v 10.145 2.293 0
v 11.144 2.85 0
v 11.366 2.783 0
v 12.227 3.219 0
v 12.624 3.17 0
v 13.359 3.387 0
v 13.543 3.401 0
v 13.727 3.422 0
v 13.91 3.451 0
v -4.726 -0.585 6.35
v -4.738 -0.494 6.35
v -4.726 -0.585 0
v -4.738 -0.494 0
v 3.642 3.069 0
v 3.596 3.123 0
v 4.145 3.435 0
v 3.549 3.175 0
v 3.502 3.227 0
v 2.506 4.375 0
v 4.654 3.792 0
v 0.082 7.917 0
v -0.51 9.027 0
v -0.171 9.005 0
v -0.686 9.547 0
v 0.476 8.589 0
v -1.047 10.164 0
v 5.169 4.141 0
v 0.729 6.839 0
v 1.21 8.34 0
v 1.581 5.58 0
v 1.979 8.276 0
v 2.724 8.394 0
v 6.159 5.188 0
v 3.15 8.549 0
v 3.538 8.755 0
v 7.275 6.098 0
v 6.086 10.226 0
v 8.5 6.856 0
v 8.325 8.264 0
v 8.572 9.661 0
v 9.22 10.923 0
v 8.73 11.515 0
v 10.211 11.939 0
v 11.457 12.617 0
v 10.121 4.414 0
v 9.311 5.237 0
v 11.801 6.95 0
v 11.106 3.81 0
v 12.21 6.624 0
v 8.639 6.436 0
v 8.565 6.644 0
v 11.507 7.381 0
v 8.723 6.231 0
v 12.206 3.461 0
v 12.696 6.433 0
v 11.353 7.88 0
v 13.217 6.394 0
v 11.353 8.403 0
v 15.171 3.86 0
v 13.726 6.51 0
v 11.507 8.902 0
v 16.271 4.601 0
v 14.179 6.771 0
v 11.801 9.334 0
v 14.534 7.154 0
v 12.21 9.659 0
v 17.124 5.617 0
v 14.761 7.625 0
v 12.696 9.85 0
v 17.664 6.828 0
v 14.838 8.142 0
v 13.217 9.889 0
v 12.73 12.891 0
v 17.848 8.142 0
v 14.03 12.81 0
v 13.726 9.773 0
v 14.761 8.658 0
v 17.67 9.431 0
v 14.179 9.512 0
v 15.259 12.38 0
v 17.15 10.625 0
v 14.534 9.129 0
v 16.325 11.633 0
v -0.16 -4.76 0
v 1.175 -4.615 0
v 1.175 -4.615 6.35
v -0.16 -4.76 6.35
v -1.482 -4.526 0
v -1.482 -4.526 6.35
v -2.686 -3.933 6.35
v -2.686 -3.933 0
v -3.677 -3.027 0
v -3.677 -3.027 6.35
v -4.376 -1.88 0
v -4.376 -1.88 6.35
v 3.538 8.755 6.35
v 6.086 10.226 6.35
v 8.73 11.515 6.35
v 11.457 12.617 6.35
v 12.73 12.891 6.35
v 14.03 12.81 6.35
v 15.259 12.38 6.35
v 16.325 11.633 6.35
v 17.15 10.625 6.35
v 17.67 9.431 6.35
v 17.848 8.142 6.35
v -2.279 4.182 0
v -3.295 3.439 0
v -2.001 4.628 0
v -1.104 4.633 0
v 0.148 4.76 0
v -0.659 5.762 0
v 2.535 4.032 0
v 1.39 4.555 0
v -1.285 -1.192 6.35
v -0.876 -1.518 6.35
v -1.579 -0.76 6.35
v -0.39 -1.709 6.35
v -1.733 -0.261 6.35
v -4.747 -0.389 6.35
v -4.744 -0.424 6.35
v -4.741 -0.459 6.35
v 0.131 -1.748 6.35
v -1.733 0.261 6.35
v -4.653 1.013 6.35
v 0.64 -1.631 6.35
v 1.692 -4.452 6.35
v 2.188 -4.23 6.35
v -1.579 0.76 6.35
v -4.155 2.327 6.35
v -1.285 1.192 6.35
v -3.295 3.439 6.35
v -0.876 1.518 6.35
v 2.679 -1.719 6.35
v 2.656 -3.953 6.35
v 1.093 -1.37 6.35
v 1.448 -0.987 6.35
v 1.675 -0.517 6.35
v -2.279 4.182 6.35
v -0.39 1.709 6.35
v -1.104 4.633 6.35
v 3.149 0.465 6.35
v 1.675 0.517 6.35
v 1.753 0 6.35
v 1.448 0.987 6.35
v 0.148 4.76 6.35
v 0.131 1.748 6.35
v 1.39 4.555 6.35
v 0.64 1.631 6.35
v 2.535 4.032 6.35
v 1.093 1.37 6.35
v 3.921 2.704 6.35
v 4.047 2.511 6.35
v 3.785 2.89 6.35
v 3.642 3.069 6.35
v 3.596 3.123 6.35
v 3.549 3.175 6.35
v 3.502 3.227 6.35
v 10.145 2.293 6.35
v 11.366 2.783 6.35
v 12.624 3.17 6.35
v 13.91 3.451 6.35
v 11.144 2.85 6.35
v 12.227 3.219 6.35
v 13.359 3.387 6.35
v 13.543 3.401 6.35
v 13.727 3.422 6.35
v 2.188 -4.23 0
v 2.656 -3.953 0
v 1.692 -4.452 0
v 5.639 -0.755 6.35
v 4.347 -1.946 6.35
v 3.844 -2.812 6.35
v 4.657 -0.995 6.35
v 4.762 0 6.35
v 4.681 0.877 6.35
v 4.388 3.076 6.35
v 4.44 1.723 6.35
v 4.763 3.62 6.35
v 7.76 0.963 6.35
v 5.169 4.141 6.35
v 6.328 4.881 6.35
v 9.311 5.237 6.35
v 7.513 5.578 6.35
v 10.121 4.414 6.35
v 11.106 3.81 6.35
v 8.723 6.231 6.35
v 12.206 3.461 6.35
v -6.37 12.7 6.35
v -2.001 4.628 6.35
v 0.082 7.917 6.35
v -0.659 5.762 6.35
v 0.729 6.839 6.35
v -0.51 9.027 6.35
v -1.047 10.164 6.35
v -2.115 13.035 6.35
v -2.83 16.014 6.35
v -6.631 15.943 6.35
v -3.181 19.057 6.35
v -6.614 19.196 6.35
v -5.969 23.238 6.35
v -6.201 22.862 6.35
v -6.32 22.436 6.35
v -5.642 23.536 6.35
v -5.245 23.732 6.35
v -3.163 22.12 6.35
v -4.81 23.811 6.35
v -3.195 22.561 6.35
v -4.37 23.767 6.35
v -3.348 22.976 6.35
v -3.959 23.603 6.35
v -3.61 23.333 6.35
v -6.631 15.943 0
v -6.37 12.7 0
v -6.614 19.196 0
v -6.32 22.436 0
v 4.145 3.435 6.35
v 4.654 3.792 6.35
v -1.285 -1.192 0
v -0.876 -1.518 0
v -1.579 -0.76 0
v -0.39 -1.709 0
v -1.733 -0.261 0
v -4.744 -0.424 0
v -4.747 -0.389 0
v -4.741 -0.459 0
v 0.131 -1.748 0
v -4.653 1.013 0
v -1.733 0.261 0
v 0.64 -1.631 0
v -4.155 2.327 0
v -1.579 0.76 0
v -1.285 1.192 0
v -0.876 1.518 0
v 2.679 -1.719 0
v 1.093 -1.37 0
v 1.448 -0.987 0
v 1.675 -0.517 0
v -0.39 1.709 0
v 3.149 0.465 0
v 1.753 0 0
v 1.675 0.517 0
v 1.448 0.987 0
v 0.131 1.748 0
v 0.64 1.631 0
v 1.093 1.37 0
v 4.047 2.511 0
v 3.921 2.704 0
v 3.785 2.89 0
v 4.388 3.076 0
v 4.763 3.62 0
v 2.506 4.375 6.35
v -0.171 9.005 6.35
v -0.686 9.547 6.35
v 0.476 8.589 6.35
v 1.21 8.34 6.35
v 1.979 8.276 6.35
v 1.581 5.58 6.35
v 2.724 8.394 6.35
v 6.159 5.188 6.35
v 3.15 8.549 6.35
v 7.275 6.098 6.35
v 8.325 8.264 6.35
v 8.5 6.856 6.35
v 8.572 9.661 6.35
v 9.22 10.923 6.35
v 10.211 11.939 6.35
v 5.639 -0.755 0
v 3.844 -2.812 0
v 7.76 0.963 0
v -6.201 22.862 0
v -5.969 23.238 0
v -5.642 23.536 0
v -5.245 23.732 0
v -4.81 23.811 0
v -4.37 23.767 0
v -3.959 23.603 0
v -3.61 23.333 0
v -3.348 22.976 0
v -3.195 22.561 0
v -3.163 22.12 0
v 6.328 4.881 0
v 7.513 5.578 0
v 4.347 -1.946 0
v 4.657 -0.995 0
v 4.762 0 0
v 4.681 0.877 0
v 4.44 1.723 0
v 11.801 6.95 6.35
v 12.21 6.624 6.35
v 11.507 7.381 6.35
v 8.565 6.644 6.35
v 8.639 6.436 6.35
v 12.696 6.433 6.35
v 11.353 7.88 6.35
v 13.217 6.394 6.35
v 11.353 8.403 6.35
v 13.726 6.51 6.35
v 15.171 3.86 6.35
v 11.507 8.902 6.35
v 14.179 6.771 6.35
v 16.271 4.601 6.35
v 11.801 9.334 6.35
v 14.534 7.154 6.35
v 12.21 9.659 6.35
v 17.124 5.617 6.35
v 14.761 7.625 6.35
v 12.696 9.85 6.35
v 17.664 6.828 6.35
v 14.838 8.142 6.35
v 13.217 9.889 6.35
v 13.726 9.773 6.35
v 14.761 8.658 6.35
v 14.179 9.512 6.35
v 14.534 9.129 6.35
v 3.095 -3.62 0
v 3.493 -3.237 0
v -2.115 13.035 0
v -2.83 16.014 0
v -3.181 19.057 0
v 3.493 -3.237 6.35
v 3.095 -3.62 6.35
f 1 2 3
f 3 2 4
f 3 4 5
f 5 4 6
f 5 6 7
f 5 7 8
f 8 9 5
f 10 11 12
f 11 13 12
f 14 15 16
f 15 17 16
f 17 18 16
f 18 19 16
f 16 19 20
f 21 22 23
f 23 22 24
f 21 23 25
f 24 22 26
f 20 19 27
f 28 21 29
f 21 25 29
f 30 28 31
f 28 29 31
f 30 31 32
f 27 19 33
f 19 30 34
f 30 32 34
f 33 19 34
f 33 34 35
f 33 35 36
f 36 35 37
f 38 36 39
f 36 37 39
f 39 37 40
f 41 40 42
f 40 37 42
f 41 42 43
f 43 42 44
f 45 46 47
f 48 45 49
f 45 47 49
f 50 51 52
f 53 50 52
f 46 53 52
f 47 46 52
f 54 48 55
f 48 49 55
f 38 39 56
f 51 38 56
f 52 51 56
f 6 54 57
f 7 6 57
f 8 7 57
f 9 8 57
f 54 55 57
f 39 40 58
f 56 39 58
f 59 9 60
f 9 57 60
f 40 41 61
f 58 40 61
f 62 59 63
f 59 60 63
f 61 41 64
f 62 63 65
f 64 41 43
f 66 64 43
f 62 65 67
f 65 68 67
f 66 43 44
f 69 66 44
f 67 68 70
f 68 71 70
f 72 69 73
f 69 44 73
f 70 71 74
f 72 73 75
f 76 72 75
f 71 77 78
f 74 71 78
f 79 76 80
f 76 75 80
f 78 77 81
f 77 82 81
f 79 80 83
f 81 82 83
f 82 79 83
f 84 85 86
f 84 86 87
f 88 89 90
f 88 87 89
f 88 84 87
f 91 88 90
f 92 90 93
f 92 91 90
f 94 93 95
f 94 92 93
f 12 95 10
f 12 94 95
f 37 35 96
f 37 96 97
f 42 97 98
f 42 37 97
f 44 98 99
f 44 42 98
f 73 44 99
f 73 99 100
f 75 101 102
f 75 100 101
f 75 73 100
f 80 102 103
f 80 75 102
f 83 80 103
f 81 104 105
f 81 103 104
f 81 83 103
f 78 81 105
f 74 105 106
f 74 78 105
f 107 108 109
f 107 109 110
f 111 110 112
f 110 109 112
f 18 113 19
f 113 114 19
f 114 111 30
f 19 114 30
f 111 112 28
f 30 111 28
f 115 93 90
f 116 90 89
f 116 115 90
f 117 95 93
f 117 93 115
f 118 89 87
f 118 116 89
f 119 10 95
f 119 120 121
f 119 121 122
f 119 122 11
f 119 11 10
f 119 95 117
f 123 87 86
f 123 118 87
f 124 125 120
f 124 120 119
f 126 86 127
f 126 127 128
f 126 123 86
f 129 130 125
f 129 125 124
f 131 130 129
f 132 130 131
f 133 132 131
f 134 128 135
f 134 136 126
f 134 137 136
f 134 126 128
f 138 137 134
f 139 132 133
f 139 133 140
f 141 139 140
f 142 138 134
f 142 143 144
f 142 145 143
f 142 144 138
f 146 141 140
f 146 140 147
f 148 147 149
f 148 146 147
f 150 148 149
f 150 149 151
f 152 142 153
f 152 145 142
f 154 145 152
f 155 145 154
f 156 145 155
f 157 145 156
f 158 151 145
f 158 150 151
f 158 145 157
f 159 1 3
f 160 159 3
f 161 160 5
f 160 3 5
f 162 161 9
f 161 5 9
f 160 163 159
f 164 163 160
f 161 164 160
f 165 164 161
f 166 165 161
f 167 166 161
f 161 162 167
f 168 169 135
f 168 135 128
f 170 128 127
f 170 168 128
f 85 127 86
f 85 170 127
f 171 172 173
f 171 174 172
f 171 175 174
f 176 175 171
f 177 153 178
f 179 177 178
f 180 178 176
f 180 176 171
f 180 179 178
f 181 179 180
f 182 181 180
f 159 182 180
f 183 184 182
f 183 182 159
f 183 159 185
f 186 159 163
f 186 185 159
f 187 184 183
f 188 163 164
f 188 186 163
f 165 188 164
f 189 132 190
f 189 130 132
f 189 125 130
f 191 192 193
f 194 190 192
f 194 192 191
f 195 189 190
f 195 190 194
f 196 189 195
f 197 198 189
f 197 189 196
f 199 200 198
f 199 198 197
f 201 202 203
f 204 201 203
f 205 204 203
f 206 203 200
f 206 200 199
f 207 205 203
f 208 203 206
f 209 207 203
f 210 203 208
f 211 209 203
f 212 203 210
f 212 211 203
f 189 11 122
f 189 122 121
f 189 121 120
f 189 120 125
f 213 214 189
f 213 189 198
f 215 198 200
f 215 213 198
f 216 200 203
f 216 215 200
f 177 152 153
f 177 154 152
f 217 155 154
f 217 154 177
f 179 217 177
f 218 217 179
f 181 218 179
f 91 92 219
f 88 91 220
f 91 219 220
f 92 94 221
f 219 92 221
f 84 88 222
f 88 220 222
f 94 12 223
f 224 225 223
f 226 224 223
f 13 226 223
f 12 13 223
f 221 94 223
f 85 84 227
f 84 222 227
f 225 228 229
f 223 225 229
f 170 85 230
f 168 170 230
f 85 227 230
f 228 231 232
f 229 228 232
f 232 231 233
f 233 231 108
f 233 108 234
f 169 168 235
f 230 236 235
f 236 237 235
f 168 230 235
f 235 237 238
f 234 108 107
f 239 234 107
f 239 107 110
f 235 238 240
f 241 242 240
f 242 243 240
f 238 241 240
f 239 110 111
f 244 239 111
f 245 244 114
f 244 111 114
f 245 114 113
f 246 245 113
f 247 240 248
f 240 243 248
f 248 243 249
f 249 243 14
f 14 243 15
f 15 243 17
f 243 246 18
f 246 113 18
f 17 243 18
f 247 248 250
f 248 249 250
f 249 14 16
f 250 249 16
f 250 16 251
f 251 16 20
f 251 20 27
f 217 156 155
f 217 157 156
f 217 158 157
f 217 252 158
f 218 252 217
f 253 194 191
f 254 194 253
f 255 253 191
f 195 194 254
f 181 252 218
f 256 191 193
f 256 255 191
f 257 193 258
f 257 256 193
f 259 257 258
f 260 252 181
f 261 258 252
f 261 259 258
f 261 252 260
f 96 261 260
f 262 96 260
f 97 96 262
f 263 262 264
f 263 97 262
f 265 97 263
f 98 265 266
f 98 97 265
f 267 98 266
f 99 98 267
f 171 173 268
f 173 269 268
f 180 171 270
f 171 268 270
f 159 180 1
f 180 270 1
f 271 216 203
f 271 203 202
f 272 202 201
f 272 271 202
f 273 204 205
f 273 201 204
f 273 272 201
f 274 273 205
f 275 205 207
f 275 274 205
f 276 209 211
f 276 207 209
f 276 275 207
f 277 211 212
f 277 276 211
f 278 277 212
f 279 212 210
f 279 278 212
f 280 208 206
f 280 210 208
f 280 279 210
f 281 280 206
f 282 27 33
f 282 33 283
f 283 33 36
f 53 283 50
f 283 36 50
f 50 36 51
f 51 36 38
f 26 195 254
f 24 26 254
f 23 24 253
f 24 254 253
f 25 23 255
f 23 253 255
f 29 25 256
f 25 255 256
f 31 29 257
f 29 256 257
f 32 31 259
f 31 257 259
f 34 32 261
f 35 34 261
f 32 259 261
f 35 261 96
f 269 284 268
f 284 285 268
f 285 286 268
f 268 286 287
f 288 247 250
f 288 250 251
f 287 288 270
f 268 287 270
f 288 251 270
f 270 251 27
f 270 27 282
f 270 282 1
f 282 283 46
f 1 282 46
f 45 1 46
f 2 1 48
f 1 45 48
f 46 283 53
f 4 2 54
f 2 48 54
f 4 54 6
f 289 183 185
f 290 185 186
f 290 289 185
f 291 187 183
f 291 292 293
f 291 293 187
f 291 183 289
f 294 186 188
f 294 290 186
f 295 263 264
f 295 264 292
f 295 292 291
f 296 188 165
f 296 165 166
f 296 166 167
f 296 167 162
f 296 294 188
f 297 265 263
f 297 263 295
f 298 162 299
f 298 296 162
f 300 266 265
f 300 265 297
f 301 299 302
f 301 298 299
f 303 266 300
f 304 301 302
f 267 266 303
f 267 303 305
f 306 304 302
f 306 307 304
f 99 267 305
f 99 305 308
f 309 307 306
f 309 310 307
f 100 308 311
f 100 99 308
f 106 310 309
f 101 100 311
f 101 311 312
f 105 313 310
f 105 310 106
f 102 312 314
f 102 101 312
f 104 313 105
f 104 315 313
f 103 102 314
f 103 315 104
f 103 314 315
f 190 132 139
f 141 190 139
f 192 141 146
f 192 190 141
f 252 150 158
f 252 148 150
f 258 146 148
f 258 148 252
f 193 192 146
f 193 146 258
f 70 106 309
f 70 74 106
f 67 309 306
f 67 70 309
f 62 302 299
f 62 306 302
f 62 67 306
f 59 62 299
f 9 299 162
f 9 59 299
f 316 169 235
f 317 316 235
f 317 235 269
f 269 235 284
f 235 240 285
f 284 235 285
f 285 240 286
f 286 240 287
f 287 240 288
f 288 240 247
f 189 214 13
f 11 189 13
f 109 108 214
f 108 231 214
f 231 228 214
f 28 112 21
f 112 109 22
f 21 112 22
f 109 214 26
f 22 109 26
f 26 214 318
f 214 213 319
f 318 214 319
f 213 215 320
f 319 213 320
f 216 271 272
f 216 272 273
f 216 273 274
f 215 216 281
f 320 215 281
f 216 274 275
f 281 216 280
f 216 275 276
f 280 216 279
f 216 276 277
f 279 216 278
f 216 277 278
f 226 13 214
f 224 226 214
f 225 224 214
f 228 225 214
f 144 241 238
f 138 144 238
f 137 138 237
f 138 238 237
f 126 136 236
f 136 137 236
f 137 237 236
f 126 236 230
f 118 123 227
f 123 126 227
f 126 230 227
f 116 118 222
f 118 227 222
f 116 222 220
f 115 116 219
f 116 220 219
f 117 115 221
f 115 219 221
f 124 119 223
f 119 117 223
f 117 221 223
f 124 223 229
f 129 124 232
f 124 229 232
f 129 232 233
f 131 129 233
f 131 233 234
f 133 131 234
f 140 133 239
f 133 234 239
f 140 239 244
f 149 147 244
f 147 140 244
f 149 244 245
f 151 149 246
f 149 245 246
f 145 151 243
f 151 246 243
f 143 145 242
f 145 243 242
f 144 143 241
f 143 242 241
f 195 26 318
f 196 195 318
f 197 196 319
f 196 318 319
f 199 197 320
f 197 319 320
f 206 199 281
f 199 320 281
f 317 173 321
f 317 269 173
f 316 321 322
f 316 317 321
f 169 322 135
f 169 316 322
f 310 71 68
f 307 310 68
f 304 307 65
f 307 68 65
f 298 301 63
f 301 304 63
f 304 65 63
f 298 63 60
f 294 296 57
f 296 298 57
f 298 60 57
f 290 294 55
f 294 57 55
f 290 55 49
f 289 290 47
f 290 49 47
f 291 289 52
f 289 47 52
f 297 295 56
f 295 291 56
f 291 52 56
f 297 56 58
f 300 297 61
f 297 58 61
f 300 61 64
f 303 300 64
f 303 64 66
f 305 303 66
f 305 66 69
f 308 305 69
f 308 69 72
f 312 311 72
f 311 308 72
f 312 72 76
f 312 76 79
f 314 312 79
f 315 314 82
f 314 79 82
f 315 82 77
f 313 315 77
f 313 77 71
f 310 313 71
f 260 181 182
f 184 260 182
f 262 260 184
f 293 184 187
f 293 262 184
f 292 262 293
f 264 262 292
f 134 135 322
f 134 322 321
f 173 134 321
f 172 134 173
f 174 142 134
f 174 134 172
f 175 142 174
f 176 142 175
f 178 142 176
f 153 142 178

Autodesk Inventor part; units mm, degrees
ref_plane "YZ Plane" through (0, 0, 0) normal (1, 0, 0) x (0, 1, 0)
ref_plane "XZ Plane" through (0, 0, 0) normal (0, 1, 0) x (-1, 0, 0)
ref_plane "XY Plane" through (0, 0, 0) normal (0, 0, 1) x (1, 0, 0)
sketch "Sketch1" plane through (0, 0, 0) normal (0, 0, 1) x (1, 0, 0)
  circle A0 centre (0, 0) radius 1.7526
  circle A1 centre (0, 0) radius 4.7625
  circle A2 centre (0, 0) radius 19.05 construction
  circle A3 centre (0, 19.05) radius 3.175 construction
  line L0 (0, 19.05) -> (0, 0) construction
  line L1 (0, 19.05) -> (3.175, 19.05) construction
  arc A4 (-3.1628, 22.1199) -> (-6.3202, 22.4358) centre (-4.7468, 22.225) ccw
  arc A5 (-6.3202, 22.4358) -> (-6.3695, 12.7) centre (31.4424, 17.3766) ccw
  line L2 (-6.3695, 12.7) -> (-4.7265, -0.5846)
  circle A6 centre (13.0858, 8.1416) radius 6.35 construction
  line L3 (7.1188, 5.9698) -> (13.0858, 8.1416) construction
  line L4 (0, 0) -> (-3.1615, 8.6862) construction
  circle A7 centre (13.0858, 8.1416) radius 1.7526
  circle A8 centre (13.0858, 8.1416) radius 4.7625
  arc A9 (-3.1628, 22.1199) -> (3.5023, 3.2272) centre (22.1815, 20.4391) ccw
  arc A10 (11.457, 12.6169) -> (-3.295, 3.4387) centre (25.8792, -27.008) ccw
  line L5 (11.457, 12.6169) -> (7.5101, 11.1804) construction
  arc A11 (13.9098, 3.4509) -> (3.8438, -2.8118) centre (16.6566, -12.1846) ccw
  circle A12 centre (4.7625, -9.525) radius 6.35 construction
  circle A13 centre (4.7625, -9.525) radius 1.7526
  circle A14 centre (4.7625, -9.525) radius 4.7625
  arc A15 (13.3589, 3.387) -> (8.6027, -6.7083) centre (13.723, -2.9526) ccw
  arc A16 (-4.7466, -0.3889) -> (1.6034, -13.0889) centre (14.2398, 1.1668) ccw
  arc A17 (8.5001, 6.856) -> (2.8341, -5.1704) centre (13.723, -2.9526) ccw
  arc A18 (1.1746, -4.6154) -> (1.7749, -5.8161) centre (14.2398, 1.1668) ccw
  arc A19 (8.7233, 6.2311) -> (3.6415, 3.0694) centre (25.8792, -27.008) ccw
  circle A20 centre (0, 0) radius 3.175 construction
  point P0 (3.7177, 2.9766)
  point P1 (0.7293, 6.839)
  point P2 (2.6557, -3.9533)
  point P3 (-4.7377, -0.494)
  dimension "d1" = 9.525
  dimension "d2" = 38.1
  dimension "d3" = 6.35
  dimension "d0" = 3.5052
  dimension "d5" = 3.175
  dimension "d6" = 3.175
  dimension "d7" = 38.1
  dimension "d8" = 6.35
  dimension "d11" = 12.7
  dimension "d12" = 3.5052
  dimension "d13" = 15.0813
  dimension "d14" = 3.175
  dimension "d16" = 9.525
  dimension "d18" = 25.4
  dimension "d19" = 15.875
  dimension "d21" = 12.7
  dimension "d22" = 3.5052
  dimension "d23" = 9.525
  dimension "d24" = 4.7625
  dimension "d25" = 9.525
  dimension "d26" = 6.35
  dimension "d27" = 4.7625
  dimension "d28" = 4.7625
  dimension "d29" = 4.7625
  dimension "d31" = 19.05
  dimension "d32" = 20
  dimension "d33" = 6.35
extrude "Extrusion1" add sketch "Sketch1" along normal blind 6.35 contours A1 A17 | A19 A17 A1 | A1 A9 A10 A8 A17 A19 | A1 A10 A9 | A17 A19 A8 A15 A11 A1 | A1 A17 | A17 A8 A19 | A1 L2 A5 A4 A9 A10 | A8 | A8 A11 A15
fillet "Fillet1" radius 3.175 1 edges at (0.7293, 6.839, 3.175)
properties part number "Lever" material "Aluminum 6061"
